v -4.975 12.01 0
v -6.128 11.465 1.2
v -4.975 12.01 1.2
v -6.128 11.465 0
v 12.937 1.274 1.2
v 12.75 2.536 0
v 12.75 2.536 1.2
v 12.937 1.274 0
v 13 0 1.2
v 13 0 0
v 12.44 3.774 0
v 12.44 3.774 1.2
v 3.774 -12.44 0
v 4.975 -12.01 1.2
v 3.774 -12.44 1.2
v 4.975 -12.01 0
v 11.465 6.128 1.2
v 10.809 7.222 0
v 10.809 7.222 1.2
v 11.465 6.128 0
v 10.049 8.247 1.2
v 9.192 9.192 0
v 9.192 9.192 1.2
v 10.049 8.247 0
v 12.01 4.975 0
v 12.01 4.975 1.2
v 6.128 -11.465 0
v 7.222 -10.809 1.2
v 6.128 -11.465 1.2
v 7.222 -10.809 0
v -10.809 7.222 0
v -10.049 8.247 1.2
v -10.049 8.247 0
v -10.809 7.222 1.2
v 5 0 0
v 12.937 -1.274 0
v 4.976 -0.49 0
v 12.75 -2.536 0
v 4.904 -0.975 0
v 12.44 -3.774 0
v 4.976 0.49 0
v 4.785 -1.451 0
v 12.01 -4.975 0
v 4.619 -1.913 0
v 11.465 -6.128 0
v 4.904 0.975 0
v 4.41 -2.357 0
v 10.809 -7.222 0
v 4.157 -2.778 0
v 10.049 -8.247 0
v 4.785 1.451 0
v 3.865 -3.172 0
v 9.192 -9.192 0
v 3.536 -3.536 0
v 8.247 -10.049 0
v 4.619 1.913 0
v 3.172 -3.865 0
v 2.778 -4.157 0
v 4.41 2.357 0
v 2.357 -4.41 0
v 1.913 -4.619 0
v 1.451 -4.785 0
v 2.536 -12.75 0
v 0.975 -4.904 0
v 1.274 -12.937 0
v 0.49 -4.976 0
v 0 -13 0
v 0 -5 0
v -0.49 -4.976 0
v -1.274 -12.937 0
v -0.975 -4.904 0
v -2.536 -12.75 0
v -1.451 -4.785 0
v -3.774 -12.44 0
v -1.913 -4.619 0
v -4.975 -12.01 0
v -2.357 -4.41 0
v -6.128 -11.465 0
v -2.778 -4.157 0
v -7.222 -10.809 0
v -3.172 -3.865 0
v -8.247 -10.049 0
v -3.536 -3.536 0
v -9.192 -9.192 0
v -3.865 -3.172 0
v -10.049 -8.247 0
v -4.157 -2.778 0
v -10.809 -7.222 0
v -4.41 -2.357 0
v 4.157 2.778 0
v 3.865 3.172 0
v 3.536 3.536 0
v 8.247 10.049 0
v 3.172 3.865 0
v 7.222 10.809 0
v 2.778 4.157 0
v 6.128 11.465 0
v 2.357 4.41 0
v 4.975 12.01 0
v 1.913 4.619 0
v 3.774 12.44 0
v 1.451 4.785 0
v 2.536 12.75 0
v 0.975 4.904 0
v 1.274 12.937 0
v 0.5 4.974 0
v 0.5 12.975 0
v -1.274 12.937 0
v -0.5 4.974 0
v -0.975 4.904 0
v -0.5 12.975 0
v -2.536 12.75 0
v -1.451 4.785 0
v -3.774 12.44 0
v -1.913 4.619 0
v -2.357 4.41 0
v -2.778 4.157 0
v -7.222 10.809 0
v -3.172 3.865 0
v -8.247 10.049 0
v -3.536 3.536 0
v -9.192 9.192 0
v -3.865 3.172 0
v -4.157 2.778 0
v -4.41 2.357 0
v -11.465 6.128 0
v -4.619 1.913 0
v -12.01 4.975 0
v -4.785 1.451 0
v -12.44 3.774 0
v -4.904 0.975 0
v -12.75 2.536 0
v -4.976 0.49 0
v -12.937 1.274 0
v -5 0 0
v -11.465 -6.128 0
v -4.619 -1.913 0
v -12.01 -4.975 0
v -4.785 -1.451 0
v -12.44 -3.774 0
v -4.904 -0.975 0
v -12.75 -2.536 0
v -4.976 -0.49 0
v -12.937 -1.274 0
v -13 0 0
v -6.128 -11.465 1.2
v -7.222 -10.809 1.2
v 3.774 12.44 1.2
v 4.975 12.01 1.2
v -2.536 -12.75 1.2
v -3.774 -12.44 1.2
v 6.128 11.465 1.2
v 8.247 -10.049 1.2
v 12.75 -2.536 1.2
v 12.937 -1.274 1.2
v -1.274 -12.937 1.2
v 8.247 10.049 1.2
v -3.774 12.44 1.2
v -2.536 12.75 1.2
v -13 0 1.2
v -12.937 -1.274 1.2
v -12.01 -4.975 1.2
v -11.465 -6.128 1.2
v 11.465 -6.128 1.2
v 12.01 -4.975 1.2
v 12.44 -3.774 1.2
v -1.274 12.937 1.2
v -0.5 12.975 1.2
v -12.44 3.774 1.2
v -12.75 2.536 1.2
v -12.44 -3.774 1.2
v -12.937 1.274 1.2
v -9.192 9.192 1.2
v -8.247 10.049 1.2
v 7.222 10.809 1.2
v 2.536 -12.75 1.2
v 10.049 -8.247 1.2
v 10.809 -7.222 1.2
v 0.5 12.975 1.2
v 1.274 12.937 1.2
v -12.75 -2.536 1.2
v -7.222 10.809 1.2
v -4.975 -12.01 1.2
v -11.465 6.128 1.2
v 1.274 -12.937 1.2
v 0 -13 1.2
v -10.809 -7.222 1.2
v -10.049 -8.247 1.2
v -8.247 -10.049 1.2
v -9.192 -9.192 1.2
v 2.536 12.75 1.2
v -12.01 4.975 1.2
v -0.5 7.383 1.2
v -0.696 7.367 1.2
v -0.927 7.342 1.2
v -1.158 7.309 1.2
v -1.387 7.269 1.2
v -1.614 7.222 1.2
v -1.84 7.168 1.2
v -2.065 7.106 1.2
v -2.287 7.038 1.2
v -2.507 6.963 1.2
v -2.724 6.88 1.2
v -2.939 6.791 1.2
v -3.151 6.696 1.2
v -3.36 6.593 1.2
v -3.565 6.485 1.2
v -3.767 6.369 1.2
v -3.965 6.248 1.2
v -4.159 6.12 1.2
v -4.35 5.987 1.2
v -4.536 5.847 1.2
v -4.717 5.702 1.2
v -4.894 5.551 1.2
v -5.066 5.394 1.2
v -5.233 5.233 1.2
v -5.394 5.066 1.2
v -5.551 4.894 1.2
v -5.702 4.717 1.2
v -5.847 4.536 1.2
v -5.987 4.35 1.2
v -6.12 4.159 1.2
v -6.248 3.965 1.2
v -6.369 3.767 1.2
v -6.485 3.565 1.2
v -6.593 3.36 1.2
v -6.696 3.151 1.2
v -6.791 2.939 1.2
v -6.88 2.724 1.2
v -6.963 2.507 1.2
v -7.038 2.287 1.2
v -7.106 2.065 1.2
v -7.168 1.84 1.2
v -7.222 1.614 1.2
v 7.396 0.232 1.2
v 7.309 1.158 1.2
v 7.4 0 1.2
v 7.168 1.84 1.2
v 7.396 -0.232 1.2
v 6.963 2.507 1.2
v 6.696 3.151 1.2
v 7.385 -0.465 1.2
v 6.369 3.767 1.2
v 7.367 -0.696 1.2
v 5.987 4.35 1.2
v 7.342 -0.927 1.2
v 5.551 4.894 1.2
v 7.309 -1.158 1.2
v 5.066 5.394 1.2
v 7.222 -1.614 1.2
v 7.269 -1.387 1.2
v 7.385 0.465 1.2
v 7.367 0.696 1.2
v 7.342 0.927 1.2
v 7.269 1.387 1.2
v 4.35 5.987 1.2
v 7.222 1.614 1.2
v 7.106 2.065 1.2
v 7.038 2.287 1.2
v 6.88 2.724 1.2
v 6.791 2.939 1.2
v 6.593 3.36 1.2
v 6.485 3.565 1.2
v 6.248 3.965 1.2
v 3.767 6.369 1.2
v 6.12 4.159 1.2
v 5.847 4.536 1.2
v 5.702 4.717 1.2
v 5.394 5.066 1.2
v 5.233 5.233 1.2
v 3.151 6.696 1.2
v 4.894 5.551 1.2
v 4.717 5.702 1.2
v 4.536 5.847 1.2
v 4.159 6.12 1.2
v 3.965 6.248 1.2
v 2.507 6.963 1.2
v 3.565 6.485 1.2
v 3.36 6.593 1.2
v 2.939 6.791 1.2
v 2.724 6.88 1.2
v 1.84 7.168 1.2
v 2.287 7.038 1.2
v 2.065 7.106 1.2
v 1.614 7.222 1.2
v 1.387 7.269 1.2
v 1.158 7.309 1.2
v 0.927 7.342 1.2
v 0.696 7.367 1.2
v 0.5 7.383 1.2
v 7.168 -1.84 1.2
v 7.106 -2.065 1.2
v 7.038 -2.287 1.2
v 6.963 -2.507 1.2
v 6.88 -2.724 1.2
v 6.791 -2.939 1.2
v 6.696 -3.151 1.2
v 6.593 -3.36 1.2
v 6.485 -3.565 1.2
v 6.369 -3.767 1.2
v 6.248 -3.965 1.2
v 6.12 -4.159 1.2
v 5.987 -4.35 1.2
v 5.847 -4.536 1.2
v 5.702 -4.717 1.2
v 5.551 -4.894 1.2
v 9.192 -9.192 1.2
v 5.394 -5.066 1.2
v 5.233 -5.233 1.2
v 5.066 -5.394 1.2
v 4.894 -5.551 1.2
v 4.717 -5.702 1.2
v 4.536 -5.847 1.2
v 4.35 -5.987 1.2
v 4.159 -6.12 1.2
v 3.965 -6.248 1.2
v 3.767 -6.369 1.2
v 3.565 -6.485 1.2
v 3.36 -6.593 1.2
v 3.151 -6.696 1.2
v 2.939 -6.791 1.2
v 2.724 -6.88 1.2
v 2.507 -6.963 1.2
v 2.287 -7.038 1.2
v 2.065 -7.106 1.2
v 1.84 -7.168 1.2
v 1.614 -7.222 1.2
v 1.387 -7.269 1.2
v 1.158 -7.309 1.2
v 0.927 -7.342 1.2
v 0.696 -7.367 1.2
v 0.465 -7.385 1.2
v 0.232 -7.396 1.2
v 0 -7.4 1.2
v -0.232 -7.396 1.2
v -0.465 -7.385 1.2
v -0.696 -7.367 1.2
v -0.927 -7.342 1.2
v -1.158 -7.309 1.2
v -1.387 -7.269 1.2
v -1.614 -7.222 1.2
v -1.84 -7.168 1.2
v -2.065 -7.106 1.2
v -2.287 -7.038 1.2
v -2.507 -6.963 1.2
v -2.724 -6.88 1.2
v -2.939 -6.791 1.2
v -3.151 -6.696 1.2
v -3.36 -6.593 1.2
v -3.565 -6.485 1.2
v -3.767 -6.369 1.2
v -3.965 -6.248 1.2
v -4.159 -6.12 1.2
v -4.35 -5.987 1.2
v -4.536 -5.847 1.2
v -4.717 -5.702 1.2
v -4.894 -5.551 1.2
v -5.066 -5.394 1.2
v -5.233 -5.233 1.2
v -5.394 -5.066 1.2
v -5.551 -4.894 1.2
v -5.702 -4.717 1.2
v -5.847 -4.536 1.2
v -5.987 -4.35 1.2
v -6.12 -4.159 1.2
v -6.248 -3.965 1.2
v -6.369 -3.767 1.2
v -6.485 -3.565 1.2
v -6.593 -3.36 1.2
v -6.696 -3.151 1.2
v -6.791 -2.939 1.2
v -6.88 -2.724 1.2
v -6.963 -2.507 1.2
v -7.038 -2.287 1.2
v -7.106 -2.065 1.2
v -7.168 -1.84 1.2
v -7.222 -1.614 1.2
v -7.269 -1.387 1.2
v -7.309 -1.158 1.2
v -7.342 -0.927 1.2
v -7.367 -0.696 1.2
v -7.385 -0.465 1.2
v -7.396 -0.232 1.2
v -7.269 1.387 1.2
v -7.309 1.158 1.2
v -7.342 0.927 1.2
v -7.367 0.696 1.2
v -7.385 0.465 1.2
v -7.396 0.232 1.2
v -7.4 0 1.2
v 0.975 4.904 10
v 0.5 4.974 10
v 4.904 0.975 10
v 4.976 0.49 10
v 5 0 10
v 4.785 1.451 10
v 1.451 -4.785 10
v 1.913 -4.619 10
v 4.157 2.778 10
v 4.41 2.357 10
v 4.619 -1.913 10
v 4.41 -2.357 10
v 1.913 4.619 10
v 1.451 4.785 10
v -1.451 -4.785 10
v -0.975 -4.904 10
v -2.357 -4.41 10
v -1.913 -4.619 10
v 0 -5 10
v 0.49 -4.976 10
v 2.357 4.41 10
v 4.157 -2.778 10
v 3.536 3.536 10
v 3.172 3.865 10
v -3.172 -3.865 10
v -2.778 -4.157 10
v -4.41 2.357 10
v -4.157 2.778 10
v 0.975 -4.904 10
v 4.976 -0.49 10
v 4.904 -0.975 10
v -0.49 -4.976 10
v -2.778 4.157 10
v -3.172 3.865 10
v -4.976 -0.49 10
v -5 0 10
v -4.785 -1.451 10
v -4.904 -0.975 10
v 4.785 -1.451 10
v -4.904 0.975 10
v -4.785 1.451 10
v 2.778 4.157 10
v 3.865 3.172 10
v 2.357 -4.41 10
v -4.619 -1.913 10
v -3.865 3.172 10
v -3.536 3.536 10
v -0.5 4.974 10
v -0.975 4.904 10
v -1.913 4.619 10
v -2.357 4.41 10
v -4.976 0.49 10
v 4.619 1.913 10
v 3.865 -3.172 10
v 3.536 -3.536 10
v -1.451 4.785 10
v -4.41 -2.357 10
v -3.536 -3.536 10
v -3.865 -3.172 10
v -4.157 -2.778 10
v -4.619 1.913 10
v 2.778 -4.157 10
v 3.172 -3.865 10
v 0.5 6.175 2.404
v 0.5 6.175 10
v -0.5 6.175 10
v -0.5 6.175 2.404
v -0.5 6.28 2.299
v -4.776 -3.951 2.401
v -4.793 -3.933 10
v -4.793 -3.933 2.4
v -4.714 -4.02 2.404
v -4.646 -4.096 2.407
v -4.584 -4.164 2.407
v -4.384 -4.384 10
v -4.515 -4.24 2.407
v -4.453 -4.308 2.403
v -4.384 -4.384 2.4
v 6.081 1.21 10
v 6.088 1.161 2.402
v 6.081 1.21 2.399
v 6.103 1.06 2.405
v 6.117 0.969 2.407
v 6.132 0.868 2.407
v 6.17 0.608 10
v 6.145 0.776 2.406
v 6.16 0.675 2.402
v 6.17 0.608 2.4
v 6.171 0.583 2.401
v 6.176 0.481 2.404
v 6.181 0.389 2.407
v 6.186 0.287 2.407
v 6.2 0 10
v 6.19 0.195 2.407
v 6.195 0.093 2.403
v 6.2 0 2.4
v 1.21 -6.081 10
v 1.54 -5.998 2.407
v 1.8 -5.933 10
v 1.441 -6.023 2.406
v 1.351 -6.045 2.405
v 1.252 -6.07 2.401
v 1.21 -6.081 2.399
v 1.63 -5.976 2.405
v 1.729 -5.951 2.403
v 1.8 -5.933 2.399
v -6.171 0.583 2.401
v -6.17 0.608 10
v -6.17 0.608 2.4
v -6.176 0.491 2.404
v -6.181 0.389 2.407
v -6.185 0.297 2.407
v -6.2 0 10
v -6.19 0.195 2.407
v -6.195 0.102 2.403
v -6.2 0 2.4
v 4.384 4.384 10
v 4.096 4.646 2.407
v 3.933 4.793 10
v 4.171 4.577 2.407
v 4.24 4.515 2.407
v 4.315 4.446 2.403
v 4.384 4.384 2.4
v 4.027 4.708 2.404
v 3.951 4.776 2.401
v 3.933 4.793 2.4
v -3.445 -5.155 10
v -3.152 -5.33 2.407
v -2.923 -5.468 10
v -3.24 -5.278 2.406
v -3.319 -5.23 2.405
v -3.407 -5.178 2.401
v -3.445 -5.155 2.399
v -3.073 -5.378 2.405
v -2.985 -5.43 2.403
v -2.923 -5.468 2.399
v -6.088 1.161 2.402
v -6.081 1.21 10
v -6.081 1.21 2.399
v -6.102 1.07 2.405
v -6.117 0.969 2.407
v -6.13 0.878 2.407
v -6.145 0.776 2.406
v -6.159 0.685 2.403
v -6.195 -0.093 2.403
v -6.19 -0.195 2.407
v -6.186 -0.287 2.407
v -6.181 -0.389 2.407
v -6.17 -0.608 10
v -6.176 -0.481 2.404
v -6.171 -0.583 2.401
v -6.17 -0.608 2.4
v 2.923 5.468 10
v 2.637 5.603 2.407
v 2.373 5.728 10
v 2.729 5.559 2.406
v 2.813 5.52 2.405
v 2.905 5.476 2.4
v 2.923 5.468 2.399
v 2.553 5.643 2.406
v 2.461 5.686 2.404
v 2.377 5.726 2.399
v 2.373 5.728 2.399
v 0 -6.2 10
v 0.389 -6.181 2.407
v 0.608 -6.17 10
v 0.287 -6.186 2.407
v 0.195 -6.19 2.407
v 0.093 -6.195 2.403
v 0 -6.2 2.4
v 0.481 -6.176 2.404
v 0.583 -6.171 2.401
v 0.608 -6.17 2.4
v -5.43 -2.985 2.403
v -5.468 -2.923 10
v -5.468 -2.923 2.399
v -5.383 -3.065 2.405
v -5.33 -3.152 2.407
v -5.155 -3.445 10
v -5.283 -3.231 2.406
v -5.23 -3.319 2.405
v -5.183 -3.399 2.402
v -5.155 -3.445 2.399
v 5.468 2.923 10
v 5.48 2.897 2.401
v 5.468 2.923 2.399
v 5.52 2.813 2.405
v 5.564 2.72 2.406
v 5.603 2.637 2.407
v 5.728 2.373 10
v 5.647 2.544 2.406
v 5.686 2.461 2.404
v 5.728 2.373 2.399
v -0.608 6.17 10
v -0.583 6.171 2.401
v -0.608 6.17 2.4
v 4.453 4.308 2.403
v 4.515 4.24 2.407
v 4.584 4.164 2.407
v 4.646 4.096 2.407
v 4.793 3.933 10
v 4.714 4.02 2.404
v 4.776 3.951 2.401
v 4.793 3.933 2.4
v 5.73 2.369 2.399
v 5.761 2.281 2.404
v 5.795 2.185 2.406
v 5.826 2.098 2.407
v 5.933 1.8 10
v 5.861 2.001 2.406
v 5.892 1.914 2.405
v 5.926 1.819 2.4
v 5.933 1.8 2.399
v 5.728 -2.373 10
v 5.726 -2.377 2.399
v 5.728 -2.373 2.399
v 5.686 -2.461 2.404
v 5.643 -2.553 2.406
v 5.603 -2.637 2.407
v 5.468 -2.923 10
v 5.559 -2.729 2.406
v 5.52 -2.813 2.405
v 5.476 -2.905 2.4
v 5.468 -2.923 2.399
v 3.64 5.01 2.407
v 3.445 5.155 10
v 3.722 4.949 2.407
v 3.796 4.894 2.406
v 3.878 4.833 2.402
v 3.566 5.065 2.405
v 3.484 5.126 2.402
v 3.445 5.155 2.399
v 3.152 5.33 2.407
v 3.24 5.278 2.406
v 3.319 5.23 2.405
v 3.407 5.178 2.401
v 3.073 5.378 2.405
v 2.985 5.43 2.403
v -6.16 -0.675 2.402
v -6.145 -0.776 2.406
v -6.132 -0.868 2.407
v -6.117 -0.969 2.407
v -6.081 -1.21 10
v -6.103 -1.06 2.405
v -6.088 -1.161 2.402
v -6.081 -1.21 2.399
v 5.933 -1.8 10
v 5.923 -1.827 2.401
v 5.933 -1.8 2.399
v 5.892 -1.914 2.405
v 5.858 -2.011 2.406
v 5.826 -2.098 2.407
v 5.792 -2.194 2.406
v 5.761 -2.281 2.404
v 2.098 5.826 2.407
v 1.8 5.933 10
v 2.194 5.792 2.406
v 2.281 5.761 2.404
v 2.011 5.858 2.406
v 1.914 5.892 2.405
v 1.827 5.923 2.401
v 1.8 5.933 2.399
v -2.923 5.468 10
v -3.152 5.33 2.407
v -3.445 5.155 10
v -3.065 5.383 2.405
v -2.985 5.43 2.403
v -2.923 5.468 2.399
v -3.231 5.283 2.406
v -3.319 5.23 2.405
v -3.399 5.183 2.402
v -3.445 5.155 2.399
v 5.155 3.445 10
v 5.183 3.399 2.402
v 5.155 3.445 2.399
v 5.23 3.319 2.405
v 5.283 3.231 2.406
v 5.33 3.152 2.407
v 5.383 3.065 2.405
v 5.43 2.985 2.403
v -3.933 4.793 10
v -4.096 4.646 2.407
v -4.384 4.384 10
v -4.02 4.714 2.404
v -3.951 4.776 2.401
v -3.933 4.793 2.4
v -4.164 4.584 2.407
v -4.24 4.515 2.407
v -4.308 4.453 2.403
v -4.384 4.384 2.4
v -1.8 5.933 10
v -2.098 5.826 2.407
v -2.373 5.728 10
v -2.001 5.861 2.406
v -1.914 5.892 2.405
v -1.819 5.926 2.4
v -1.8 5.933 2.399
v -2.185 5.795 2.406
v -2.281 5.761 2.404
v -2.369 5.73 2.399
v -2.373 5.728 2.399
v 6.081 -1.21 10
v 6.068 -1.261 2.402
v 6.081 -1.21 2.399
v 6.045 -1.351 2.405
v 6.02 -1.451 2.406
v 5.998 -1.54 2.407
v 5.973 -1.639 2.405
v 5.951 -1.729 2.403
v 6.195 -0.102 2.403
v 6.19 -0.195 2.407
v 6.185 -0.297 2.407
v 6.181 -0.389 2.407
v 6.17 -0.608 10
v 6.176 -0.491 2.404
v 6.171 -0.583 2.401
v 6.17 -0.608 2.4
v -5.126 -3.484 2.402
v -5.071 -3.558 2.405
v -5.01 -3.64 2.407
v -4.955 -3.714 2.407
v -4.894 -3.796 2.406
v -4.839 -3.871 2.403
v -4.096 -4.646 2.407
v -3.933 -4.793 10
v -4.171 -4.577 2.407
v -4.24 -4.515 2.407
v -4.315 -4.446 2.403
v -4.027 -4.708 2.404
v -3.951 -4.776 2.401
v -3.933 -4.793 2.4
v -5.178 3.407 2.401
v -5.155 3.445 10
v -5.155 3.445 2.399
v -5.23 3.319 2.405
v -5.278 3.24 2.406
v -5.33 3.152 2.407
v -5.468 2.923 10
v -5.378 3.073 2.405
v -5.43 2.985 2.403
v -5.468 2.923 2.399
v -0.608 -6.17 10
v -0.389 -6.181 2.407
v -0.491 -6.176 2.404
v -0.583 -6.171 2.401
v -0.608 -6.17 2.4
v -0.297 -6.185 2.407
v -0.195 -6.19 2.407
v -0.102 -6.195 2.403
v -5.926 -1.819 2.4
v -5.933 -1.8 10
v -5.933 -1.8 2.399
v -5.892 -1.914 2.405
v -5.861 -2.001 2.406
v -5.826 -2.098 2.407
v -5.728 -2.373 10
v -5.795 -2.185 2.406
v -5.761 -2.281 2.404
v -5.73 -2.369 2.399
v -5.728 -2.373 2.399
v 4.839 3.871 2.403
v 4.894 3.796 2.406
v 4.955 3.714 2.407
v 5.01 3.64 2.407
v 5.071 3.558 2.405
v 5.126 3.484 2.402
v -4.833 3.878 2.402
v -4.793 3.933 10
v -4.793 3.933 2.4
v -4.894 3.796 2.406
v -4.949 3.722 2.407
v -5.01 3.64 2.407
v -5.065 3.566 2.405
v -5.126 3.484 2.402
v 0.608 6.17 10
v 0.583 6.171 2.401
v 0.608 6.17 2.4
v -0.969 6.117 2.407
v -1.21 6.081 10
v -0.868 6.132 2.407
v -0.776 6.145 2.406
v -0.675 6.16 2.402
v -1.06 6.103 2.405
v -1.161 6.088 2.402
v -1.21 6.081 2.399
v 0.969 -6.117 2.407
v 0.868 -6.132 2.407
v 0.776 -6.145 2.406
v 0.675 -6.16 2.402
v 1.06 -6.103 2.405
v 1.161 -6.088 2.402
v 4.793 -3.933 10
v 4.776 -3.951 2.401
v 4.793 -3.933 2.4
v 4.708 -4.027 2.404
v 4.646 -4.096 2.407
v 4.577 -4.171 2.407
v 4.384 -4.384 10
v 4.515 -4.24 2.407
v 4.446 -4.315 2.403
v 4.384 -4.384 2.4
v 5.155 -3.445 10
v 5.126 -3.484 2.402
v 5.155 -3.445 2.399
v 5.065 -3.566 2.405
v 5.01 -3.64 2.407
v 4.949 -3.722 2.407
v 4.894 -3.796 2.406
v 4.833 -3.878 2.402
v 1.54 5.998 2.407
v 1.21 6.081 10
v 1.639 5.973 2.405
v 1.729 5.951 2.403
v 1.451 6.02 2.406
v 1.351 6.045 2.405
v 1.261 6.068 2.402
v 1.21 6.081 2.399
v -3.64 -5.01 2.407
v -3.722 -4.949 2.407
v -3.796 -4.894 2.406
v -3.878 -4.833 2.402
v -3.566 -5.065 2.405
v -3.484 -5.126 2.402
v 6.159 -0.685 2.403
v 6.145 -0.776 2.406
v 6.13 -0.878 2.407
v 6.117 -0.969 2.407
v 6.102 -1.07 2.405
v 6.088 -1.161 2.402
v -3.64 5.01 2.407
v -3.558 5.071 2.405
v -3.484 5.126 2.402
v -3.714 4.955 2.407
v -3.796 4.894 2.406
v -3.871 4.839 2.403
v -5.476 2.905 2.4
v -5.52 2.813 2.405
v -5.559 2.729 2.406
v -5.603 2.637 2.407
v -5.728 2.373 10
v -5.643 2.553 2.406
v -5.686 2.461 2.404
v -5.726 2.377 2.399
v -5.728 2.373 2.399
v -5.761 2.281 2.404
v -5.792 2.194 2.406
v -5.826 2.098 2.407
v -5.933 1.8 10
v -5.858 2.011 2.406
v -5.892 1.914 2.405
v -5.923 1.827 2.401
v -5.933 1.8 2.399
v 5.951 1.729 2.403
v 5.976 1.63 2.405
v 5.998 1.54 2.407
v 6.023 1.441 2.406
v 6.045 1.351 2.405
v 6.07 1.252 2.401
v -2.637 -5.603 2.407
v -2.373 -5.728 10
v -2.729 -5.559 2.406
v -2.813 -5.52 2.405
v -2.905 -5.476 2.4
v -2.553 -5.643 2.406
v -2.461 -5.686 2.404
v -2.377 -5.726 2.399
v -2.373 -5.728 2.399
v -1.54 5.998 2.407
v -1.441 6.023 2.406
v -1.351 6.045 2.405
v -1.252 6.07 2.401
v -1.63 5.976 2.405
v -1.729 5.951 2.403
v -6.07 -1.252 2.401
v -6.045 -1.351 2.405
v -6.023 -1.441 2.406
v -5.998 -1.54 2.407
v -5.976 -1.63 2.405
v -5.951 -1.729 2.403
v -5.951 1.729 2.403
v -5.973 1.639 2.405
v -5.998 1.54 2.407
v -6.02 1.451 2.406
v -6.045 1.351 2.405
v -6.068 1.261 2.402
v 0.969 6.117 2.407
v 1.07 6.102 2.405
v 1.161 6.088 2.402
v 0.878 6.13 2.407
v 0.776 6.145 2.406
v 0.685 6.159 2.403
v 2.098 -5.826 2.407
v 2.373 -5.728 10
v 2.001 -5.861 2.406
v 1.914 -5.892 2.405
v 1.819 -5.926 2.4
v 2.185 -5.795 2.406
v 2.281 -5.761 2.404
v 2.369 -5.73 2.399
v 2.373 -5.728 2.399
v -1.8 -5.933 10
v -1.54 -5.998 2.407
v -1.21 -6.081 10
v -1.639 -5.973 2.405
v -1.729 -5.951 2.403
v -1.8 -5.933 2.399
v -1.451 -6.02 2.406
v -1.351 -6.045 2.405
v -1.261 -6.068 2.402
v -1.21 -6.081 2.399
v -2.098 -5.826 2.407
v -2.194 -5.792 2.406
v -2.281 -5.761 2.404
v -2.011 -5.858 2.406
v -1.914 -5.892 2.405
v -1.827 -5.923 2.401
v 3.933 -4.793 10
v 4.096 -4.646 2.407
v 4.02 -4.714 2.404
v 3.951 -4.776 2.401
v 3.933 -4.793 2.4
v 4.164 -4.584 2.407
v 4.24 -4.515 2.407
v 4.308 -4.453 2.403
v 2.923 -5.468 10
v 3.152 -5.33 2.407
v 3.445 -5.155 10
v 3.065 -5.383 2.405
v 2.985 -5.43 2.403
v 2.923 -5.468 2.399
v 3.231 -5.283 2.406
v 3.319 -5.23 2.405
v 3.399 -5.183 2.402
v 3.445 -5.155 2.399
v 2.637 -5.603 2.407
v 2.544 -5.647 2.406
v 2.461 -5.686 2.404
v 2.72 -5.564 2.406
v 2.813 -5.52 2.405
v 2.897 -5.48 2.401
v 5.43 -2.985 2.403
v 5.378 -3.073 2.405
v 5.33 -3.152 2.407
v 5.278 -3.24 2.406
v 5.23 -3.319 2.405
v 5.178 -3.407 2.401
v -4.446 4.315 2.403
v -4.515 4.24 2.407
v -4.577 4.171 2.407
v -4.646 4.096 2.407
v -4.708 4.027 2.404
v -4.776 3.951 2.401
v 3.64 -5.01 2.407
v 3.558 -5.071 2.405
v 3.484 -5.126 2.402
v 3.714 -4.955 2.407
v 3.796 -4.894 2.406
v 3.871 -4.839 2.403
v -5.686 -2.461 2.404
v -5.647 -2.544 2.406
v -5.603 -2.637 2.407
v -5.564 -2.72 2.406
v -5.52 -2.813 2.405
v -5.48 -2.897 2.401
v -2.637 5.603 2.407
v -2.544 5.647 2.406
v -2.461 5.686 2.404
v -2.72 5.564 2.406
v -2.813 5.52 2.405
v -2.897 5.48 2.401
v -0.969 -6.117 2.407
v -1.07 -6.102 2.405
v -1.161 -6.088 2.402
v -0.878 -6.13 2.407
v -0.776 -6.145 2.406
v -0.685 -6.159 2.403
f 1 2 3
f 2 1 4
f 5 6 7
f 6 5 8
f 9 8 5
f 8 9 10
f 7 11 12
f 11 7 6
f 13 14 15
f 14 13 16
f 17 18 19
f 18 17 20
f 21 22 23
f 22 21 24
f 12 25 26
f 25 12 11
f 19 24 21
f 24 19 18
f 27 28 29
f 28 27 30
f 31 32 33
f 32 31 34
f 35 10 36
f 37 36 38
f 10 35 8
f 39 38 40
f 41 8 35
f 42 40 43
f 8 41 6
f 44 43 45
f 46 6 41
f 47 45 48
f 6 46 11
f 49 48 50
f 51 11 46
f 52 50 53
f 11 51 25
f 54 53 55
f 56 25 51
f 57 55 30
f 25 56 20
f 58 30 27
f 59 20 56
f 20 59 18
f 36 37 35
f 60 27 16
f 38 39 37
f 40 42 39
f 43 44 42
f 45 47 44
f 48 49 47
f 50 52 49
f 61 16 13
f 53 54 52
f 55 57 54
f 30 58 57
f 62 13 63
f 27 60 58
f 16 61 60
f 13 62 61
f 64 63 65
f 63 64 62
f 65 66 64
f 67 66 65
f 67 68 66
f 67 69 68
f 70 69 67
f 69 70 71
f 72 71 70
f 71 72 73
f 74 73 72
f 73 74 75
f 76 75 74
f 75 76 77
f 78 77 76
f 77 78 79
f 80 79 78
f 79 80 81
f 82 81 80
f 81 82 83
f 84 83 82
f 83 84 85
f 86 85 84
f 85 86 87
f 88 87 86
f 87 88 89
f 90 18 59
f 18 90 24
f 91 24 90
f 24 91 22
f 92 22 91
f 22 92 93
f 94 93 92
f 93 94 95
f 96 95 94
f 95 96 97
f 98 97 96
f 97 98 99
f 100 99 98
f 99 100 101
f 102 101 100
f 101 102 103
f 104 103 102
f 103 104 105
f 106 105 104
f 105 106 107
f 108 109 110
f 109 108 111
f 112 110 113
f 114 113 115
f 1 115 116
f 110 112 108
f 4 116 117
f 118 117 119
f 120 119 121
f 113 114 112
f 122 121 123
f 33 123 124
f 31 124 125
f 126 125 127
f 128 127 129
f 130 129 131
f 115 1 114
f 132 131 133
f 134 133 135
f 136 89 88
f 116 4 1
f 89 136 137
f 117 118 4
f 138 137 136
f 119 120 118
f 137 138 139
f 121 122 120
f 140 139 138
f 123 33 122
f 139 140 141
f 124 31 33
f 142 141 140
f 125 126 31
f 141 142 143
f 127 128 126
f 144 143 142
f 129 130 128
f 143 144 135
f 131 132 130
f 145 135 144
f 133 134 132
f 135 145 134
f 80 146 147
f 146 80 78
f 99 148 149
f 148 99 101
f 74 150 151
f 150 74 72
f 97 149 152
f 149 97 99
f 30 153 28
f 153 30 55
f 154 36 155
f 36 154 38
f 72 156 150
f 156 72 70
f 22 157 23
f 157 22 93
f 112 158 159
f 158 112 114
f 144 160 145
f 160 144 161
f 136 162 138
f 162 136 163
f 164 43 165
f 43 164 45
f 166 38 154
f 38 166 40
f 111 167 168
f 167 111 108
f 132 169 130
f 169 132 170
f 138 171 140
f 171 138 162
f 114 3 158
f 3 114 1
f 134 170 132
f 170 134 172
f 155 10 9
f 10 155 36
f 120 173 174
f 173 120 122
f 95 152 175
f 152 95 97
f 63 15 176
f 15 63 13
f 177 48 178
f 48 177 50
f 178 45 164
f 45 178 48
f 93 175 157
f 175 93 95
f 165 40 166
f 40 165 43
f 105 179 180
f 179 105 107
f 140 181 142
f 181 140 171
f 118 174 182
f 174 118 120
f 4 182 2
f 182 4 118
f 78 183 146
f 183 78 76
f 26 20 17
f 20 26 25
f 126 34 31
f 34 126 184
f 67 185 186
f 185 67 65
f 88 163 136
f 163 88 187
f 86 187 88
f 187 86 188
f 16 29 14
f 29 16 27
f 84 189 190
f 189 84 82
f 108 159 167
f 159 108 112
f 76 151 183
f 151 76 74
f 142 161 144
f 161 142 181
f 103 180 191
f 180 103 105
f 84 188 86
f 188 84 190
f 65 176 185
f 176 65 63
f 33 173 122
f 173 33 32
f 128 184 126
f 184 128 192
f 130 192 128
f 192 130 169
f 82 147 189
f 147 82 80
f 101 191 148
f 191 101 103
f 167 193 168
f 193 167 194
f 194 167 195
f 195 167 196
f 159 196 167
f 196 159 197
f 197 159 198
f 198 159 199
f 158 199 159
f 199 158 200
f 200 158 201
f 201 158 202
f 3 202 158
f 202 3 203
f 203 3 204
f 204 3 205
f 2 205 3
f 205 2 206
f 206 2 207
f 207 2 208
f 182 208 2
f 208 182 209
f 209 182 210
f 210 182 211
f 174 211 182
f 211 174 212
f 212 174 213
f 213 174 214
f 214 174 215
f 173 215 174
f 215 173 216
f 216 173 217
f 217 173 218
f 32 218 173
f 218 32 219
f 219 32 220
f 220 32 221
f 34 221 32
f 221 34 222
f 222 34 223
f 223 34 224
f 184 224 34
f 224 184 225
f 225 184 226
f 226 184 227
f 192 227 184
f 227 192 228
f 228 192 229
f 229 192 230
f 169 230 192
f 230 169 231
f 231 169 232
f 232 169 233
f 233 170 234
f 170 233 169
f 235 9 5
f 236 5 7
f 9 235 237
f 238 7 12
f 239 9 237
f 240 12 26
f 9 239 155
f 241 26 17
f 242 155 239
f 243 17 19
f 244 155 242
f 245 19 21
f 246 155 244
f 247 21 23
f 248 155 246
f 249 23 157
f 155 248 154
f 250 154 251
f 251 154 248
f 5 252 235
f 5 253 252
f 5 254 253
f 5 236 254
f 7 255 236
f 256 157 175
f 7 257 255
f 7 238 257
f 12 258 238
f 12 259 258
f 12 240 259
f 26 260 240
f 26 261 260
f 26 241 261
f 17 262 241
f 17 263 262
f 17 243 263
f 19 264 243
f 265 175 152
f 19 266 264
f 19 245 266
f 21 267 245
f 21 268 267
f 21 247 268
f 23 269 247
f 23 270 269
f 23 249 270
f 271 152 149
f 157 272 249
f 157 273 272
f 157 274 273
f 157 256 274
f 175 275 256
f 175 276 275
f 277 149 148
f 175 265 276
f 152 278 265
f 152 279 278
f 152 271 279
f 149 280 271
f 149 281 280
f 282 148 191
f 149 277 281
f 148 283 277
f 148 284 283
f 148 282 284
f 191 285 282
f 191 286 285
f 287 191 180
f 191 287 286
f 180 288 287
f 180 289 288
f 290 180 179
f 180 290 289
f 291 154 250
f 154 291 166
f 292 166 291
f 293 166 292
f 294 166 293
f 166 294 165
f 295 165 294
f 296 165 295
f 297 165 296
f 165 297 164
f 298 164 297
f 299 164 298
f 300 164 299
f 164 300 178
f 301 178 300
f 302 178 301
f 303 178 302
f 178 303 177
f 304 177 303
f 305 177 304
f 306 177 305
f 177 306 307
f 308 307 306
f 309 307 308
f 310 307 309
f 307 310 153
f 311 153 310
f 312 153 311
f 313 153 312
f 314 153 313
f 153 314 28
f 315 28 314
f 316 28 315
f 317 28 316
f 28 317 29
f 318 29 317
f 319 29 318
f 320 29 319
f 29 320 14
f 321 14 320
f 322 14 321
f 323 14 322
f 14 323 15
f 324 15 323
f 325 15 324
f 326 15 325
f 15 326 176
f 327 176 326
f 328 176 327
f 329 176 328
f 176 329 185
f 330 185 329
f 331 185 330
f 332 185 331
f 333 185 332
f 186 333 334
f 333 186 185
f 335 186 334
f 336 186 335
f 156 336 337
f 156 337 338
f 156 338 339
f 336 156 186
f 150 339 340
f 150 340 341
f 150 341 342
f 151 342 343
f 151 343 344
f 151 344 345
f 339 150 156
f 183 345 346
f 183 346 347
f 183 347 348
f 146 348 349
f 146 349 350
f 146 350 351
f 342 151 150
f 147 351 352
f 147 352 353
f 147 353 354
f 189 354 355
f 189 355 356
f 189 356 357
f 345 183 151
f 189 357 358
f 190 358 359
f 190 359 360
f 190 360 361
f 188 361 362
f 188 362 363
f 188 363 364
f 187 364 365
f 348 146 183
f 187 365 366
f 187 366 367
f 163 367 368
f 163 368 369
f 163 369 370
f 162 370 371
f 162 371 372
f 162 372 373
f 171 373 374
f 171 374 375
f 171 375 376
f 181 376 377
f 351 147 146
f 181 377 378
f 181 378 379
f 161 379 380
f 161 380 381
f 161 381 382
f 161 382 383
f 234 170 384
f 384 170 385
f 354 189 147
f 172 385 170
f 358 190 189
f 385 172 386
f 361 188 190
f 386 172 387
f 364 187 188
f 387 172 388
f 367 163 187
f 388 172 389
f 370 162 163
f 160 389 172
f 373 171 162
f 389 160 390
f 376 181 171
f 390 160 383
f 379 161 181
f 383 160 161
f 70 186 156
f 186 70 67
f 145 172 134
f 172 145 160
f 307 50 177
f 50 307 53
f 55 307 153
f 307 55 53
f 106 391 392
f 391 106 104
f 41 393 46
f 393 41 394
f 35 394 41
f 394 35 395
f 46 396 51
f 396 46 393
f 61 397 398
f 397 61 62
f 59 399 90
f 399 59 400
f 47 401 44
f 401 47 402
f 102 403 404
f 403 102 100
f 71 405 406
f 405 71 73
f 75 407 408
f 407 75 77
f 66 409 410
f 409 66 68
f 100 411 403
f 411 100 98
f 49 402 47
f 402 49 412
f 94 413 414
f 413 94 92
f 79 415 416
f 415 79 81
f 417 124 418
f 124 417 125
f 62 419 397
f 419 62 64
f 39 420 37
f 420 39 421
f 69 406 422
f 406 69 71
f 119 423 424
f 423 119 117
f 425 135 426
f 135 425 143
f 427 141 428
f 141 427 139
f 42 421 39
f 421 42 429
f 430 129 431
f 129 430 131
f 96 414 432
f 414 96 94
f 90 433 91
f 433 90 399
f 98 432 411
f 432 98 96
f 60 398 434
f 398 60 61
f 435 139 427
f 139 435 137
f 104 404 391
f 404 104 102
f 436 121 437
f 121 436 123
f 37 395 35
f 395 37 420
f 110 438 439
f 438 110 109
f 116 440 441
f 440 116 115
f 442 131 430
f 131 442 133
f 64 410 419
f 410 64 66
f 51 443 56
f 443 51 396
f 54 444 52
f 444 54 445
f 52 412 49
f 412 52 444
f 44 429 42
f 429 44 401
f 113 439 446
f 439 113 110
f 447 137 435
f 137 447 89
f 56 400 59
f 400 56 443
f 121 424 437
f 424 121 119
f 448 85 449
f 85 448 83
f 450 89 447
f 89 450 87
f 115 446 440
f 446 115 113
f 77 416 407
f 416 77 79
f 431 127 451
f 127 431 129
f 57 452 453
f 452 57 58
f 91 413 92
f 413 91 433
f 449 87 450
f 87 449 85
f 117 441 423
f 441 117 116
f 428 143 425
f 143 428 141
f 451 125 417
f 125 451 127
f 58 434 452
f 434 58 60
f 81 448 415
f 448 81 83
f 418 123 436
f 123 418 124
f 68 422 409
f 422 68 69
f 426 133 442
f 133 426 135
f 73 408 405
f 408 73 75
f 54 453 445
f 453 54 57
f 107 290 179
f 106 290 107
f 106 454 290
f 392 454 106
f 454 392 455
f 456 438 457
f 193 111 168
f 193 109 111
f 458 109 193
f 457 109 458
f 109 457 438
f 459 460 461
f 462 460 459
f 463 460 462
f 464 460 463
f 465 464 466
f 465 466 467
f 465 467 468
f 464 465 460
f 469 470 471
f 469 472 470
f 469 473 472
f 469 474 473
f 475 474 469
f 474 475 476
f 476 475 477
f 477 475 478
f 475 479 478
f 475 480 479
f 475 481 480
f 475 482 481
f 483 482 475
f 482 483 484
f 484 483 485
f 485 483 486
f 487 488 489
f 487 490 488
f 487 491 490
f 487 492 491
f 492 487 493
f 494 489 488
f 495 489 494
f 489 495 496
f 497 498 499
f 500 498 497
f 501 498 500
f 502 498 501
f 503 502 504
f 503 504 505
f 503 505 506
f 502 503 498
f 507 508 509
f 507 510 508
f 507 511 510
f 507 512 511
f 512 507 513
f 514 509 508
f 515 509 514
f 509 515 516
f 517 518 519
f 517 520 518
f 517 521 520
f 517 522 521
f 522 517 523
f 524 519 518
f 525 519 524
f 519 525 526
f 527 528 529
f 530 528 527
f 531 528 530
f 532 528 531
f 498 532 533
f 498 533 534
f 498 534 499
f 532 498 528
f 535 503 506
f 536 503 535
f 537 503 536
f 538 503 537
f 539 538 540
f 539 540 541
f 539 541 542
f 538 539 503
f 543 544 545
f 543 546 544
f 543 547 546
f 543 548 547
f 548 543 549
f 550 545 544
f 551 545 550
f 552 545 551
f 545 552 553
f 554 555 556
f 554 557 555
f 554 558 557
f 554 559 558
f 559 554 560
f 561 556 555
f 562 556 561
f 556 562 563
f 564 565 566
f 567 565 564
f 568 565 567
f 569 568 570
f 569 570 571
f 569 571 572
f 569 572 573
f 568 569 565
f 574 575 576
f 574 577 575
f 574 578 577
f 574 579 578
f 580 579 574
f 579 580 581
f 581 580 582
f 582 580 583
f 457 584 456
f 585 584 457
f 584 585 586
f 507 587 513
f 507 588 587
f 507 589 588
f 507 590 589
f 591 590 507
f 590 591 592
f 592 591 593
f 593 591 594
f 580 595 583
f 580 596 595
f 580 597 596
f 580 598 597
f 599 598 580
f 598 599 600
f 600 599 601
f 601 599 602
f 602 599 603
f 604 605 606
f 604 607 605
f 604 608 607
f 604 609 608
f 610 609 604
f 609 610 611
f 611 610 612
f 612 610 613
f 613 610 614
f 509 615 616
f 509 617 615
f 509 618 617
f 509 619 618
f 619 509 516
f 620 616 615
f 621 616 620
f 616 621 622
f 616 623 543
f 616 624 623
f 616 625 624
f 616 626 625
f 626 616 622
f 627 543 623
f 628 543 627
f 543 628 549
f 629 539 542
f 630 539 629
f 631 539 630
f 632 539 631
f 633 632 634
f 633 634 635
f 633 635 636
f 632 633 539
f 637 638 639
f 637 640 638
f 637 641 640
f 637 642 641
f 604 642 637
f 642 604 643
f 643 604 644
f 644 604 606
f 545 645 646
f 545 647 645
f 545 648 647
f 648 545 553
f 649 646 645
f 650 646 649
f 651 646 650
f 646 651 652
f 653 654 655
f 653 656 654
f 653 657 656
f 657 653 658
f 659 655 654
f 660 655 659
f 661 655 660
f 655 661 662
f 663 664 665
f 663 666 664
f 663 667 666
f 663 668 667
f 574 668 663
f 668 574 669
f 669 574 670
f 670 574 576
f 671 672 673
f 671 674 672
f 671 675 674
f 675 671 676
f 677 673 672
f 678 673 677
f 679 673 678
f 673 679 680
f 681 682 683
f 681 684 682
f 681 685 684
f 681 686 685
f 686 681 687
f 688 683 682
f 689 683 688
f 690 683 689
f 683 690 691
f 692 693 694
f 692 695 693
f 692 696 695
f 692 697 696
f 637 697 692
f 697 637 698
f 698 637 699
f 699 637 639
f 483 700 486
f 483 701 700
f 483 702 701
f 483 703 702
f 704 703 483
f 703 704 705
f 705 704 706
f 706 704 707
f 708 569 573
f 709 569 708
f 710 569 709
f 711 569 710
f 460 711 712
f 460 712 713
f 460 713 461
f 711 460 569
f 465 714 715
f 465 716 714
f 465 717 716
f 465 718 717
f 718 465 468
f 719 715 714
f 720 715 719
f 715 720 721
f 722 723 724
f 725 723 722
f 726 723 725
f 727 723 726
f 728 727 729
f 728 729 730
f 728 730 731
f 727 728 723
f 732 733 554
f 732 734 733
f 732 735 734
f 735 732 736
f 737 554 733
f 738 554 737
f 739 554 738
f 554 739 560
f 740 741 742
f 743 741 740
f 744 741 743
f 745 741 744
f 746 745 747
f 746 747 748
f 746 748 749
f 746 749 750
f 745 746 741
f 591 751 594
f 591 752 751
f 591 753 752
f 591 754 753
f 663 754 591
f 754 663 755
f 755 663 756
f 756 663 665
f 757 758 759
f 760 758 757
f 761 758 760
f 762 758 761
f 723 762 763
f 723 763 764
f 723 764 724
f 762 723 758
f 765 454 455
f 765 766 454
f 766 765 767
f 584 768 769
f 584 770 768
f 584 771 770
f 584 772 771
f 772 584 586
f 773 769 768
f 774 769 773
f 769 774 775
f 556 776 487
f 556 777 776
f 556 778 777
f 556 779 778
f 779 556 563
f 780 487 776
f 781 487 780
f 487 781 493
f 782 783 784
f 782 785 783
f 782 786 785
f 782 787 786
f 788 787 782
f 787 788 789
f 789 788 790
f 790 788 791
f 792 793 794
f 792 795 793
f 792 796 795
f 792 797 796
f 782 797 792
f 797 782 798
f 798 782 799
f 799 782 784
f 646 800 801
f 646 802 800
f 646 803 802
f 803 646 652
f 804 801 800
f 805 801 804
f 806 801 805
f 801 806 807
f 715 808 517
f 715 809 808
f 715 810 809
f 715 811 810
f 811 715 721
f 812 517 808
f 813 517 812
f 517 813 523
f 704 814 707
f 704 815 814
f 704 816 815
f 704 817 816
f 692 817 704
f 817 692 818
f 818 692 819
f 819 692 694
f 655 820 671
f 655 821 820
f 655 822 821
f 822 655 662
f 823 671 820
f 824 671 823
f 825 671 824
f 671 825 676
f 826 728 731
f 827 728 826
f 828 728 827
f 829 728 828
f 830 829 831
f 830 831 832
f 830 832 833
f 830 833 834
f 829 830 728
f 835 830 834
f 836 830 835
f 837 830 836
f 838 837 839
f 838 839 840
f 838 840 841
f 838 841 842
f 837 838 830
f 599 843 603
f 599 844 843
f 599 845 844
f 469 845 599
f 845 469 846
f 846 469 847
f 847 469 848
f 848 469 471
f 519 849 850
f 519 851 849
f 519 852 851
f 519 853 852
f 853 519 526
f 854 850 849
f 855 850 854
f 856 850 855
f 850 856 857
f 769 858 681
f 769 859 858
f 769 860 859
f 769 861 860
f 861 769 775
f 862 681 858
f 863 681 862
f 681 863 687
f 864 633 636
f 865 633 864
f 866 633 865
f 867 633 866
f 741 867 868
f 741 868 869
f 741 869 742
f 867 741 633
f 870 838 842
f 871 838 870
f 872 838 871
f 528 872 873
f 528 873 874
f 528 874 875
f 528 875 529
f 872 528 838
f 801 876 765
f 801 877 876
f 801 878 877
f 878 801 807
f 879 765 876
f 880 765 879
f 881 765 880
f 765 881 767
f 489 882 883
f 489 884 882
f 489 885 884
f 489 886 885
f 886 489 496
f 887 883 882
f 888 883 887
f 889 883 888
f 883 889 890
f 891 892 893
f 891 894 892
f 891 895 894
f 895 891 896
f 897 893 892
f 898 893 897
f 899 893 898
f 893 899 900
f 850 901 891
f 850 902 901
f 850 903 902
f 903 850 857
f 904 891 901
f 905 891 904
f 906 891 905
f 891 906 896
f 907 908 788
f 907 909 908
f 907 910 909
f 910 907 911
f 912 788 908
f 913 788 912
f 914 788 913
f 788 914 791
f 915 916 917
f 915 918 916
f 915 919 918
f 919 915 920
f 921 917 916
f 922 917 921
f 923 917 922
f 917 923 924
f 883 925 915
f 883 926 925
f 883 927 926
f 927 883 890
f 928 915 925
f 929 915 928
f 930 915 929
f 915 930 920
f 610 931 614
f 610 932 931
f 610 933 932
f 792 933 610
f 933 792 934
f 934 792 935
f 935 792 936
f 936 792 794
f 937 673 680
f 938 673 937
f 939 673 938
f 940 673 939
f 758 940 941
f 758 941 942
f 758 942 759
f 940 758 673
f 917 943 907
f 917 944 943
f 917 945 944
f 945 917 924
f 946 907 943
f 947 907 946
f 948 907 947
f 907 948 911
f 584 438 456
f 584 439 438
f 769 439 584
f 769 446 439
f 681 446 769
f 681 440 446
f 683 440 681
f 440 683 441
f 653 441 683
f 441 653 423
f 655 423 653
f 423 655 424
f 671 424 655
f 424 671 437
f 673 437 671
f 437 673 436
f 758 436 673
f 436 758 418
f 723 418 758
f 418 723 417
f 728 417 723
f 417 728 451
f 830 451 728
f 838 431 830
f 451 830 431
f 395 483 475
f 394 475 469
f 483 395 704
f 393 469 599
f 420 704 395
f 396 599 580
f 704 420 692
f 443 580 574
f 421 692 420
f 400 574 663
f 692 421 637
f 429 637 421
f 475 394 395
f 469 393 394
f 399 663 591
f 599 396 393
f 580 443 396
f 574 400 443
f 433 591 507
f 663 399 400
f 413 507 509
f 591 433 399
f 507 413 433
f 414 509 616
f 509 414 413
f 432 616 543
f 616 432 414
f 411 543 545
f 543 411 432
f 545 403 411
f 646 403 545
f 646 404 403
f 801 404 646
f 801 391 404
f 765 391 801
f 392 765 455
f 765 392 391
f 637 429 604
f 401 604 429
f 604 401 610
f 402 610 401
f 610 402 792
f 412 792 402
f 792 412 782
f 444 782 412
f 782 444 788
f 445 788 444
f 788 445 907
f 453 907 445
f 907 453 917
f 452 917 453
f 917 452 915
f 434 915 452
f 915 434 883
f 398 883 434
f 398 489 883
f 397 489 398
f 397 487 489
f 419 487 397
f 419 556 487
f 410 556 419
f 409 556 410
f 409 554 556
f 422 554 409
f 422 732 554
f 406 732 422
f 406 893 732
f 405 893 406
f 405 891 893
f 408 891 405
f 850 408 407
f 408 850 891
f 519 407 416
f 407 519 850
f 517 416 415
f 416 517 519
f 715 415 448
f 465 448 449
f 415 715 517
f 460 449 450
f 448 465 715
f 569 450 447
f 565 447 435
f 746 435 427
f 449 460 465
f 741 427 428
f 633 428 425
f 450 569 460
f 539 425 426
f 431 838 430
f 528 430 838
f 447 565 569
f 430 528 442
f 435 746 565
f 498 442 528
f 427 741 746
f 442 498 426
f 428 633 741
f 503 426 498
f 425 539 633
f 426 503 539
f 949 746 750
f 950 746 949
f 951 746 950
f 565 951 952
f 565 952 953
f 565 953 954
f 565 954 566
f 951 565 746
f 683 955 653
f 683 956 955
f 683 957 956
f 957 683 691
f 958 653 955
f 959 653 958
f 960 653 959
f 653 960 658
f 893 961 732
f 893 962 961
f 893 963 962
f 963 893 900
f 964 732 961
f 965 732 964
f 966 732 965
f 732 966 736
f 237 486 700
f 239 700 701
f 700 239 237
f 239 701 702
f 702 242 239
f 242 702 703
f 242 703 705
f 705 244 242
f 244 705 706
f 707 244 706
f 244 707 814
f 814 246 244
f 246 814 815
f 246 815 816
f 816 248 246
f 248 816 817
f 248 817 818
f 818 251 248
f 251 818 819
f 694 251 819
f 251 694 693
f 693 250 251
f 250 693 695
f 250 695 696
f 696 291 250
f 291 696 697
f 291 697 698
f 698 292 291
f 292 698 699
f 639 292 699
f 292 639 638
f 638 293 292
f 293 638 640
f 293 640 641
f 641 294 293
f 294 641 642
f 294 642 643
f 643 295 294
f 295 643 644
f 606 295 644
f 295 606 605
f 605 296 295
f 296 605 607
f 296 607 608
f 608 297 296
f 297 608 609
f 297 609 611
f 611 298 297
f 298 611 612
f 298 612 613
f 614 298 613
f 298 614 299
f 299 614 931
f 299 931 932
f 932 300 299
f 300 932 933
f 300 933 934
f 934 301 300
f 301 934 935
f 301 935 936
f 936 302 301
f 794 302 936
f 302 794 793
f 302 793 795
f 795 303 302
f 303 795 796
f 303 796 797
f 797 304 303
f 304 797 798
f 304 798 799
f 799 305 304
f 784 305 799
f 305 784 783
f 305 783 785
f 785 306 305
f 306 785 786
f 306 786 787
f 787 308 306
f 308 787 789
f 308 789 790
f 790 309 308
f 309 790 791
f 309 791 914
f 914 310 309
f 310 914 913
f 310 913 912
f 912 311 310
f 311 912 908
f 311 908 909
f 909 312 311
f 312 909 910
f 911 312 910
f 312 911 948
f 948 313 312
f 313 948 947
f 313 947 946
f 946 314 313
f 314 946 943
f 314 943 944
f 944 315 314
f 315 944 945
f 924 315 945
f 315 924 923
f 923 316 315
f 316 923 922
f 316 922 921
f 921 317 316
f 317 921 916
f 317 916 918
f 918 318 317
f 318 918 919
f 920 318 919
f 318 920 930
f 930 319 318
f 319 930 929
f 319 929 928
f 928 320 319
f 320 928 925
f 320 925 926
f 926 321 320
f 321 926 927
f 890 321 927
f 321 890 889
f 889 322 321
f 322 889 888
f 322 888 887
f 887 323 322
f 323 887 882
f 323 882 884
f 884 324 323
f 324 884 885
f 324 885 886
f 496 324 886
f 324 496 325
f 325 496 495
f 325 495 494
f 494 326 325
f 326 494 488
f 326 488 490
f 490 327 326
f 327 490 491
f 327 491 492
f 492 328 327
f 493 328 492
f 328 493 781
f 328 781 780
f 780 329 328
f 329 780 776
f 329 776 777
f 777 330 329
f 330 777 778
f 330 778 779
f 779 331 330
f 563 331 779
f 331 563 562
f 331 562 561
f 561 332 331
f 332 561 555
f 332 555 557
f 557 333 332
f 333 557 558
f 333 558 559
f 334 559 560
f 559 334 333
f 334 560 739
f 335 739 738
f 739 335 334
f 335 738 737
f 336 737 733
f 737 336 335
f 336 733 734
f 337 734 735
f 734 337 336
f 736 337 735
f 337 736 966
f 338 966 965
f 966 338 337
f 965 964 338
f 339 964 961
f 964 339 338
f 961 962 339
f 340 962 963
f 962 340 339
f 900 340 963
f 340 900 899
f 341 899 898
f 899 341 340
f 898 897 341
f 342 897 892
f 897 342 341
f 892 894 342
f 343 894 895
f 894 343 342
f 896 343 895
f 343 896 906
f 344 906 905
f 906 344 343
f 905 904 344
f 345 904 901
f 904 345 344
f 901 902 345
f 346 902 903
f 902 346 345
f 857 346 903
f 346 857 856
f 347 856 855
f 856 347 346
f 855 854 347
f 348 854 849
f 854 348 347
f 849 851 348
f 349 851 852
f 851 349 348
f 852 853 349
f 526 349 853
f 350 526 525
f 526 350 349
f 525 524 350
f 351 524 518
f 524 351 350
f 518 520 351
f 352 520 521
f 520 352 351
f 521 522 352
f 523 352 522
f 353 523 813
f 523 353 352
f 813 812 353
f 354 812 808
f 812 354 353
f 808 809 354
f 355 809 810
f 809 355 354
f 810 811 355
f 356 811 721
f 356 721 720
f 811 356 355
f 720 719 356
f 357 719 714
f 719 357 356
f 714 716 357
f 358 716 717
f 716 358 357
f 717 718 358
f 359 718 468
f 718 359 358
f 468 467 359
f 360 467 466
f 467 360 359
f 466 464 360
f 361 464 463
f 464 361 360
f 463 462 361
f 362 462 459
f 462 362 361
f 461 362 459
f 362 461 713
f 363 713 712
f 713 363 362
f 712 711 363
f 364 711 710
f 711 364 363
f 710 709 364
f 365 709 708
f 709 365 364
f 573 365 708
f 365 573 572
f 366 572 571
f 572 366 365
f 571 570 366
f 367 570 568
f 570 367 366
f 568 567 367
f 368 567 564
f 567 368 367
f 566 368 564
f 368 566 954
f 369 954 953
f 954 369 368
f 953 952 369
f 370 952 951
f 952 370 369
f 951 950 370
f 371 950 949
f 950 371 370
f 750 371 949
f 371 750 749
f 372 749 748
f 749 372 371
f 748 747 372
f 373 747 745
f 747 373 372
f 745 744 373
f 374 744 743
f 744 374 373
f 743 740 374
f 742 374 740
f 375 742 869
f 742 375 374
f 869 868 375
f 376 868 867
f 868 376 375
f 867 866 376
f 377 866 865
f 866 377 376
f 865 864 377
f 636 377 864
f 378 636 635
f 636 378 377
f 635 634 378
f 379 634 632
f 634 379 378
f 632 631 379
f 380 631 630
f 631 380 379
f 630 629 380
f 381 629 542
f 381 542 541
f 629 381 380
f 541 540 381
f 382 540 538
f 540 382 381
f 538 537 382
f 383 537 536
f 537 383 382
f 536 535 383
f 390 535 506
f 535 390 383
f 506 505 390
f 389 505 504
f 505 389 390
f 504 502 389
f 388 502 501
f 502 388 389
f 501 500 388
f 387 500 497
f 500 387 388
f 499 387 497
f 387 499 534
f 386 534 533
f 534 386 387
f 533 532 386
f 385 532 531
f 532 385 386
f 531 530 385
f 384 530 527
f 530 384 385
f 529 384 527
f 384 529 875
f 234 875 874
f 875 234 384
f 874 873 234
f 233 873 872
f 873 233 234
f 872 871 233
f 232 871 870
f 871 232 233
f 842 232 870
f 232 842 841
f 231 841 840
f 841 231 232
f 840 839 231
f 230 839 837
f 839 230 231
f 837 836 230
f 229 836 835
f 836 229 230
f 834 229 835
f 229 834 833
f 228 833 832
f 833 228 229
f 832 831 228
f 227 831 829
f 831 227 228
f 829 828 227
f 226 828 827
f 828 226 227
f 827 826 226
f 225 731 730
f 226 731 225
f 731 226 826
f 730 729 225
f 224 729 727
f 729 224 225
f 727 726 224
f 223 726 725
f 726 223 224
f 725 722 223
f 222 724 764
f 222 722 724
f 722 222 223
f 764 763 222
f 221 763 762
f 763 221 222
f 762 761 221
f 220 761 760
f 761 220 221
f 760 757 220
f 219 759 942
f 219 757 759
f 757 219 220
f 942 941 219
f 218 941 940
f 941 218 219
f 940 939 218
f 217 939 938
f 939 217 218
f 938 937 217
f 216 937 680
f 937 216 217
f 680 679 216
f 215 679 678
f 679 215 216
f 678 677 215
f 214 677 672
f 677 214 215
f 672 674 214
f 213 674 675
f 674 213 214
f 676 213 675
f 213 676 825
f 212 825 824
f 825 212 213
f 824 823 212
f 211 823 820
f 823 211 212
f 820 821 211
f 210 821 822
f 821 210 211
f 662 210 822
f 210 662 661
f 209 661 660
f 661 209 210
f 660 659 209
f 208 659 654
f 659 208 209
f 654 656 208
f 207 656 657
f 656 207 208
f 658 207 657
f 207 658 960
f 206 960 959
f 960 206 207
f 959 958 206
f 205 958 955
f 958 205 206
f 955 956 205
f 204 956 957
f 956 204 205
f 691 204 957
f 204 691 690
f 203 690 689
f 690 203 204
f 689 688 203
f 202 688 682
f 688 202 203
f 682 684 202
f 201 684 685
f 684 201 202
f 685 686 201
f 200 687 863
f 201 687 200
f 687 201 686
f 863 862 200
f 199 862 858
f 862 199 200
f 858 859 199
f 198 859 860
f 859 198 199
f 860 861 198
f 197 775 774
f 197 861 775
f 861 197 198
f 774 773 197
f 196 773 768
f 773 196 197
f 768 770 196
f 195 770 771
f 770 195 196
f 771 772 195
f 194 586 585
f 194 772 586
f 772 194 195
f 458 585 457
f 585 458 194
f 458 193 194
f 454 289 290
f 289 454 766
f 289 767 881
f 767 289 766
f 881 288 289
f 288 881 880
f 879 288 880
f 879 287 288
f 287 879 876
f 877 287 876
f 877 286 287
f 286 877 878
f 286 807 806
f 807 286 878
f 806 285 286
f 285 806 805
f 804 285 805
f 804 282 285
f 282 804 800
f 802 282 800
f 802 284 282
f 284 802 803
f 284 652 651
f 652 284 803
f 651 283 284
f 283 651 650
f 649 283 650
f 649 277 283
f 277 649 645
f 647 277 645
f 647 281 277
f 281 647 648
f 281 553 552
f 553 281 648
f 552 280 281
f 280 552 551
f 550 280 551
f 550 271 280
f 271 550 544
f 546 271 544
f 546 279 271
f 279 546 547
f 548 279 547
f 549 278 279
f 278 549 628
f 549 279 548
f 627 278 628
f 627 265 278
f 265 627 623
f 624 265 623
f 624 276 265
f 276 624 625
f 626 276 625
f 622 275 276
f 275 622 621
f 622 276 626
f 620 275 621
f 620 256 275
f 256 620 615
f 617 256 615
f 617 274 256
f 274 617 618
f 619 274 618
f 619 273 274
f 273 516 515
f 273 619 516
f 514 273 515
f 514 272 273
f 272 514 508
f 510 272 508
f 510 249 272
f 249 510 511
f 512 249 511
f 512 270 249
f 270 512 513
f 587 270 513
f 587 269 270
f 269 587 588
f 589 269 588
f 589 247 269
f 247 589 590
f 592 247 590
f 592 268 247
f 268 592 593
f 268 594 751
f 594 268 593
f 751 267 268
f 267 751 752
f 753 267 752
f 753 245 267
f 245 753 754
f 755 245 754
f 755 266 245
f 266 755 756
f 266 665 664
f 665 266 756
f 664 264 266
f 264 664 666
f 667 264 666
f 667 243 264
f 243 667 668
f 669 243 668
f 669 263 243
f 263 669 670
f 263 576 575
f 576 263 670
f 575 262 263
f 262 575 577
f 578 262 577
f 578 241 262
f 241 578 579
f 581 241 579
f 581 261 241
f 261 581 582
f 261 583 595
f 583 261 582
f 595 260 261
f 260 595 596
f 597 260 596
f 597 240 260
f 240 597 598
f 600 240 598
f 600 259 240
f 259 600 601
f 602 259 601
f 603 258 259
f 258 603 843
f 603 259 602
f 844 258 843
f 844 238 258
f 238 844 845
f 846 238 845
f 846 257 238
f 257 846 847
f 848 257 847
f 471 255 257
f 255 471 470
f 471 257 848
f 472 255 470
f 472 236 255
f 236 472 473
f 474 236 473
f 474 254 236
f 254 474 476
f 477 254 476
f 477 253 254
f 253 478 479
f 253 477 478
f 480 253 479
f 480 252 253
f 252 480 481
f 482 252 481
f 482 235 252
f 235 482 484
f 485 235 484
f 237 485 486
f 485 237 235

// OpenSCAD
// pen holder for plotting robot

$fn = 64;

// holder variables
penDiameter = 10; // 12.5mm works with Sharpie Fine
                  // 11.75 for Visa-vis
                  // 10 mm for Crayola Washables
                  // 8.3m para caneta hidrográfica lavável Happy-time (slice = 0).
penRadius = penDiameter / 2;
barrelHieght = 10;
barrelWallThickness = 3;
baseThickness = 3;
cornerRounding = 2;

hat_thickness = 1.2;

hatDiameter = 26;
slice = 1;


module penHolder(){

	difference(){
		//// lip
        cylinder(hat_thickness, hatDiameter / 2, hatDiameter / 2);
        
        // pen hole
        cylinder(baseThickness, penRadius, penRadius);
        

        // expansion slice
        translate([ -slice / 2, 0, 0])
        cube([  slice, hatDiameter, barrelHieght]);
	}

	// pen barrel
	difference(){
        // barrel

        barrel();

		// bore
		cylinder(   barrelHieght * 2, penRadius, penRadius);

        
        // expansion slice
        translate([ -slice / 2, 0, 0])
        cube([  slice, hatDiameter * 2, hatDiameter * 2]);   
	};  
}

module barrel()
        union(){{
		cylinder(	barrelHieght, 
					penRadius + hat_thickness, 
					penRadius + hat_thickness);


        rotate_extrude($fn=200)
        //rotate([90, 0, 0])
        translate([-penRadius - 2 * hat_thickness, hat_thickness, 0])
        polygon(points=[[2,2], [2,0], [0,0]]);
        }
    }
//barrel();
penHolder();
